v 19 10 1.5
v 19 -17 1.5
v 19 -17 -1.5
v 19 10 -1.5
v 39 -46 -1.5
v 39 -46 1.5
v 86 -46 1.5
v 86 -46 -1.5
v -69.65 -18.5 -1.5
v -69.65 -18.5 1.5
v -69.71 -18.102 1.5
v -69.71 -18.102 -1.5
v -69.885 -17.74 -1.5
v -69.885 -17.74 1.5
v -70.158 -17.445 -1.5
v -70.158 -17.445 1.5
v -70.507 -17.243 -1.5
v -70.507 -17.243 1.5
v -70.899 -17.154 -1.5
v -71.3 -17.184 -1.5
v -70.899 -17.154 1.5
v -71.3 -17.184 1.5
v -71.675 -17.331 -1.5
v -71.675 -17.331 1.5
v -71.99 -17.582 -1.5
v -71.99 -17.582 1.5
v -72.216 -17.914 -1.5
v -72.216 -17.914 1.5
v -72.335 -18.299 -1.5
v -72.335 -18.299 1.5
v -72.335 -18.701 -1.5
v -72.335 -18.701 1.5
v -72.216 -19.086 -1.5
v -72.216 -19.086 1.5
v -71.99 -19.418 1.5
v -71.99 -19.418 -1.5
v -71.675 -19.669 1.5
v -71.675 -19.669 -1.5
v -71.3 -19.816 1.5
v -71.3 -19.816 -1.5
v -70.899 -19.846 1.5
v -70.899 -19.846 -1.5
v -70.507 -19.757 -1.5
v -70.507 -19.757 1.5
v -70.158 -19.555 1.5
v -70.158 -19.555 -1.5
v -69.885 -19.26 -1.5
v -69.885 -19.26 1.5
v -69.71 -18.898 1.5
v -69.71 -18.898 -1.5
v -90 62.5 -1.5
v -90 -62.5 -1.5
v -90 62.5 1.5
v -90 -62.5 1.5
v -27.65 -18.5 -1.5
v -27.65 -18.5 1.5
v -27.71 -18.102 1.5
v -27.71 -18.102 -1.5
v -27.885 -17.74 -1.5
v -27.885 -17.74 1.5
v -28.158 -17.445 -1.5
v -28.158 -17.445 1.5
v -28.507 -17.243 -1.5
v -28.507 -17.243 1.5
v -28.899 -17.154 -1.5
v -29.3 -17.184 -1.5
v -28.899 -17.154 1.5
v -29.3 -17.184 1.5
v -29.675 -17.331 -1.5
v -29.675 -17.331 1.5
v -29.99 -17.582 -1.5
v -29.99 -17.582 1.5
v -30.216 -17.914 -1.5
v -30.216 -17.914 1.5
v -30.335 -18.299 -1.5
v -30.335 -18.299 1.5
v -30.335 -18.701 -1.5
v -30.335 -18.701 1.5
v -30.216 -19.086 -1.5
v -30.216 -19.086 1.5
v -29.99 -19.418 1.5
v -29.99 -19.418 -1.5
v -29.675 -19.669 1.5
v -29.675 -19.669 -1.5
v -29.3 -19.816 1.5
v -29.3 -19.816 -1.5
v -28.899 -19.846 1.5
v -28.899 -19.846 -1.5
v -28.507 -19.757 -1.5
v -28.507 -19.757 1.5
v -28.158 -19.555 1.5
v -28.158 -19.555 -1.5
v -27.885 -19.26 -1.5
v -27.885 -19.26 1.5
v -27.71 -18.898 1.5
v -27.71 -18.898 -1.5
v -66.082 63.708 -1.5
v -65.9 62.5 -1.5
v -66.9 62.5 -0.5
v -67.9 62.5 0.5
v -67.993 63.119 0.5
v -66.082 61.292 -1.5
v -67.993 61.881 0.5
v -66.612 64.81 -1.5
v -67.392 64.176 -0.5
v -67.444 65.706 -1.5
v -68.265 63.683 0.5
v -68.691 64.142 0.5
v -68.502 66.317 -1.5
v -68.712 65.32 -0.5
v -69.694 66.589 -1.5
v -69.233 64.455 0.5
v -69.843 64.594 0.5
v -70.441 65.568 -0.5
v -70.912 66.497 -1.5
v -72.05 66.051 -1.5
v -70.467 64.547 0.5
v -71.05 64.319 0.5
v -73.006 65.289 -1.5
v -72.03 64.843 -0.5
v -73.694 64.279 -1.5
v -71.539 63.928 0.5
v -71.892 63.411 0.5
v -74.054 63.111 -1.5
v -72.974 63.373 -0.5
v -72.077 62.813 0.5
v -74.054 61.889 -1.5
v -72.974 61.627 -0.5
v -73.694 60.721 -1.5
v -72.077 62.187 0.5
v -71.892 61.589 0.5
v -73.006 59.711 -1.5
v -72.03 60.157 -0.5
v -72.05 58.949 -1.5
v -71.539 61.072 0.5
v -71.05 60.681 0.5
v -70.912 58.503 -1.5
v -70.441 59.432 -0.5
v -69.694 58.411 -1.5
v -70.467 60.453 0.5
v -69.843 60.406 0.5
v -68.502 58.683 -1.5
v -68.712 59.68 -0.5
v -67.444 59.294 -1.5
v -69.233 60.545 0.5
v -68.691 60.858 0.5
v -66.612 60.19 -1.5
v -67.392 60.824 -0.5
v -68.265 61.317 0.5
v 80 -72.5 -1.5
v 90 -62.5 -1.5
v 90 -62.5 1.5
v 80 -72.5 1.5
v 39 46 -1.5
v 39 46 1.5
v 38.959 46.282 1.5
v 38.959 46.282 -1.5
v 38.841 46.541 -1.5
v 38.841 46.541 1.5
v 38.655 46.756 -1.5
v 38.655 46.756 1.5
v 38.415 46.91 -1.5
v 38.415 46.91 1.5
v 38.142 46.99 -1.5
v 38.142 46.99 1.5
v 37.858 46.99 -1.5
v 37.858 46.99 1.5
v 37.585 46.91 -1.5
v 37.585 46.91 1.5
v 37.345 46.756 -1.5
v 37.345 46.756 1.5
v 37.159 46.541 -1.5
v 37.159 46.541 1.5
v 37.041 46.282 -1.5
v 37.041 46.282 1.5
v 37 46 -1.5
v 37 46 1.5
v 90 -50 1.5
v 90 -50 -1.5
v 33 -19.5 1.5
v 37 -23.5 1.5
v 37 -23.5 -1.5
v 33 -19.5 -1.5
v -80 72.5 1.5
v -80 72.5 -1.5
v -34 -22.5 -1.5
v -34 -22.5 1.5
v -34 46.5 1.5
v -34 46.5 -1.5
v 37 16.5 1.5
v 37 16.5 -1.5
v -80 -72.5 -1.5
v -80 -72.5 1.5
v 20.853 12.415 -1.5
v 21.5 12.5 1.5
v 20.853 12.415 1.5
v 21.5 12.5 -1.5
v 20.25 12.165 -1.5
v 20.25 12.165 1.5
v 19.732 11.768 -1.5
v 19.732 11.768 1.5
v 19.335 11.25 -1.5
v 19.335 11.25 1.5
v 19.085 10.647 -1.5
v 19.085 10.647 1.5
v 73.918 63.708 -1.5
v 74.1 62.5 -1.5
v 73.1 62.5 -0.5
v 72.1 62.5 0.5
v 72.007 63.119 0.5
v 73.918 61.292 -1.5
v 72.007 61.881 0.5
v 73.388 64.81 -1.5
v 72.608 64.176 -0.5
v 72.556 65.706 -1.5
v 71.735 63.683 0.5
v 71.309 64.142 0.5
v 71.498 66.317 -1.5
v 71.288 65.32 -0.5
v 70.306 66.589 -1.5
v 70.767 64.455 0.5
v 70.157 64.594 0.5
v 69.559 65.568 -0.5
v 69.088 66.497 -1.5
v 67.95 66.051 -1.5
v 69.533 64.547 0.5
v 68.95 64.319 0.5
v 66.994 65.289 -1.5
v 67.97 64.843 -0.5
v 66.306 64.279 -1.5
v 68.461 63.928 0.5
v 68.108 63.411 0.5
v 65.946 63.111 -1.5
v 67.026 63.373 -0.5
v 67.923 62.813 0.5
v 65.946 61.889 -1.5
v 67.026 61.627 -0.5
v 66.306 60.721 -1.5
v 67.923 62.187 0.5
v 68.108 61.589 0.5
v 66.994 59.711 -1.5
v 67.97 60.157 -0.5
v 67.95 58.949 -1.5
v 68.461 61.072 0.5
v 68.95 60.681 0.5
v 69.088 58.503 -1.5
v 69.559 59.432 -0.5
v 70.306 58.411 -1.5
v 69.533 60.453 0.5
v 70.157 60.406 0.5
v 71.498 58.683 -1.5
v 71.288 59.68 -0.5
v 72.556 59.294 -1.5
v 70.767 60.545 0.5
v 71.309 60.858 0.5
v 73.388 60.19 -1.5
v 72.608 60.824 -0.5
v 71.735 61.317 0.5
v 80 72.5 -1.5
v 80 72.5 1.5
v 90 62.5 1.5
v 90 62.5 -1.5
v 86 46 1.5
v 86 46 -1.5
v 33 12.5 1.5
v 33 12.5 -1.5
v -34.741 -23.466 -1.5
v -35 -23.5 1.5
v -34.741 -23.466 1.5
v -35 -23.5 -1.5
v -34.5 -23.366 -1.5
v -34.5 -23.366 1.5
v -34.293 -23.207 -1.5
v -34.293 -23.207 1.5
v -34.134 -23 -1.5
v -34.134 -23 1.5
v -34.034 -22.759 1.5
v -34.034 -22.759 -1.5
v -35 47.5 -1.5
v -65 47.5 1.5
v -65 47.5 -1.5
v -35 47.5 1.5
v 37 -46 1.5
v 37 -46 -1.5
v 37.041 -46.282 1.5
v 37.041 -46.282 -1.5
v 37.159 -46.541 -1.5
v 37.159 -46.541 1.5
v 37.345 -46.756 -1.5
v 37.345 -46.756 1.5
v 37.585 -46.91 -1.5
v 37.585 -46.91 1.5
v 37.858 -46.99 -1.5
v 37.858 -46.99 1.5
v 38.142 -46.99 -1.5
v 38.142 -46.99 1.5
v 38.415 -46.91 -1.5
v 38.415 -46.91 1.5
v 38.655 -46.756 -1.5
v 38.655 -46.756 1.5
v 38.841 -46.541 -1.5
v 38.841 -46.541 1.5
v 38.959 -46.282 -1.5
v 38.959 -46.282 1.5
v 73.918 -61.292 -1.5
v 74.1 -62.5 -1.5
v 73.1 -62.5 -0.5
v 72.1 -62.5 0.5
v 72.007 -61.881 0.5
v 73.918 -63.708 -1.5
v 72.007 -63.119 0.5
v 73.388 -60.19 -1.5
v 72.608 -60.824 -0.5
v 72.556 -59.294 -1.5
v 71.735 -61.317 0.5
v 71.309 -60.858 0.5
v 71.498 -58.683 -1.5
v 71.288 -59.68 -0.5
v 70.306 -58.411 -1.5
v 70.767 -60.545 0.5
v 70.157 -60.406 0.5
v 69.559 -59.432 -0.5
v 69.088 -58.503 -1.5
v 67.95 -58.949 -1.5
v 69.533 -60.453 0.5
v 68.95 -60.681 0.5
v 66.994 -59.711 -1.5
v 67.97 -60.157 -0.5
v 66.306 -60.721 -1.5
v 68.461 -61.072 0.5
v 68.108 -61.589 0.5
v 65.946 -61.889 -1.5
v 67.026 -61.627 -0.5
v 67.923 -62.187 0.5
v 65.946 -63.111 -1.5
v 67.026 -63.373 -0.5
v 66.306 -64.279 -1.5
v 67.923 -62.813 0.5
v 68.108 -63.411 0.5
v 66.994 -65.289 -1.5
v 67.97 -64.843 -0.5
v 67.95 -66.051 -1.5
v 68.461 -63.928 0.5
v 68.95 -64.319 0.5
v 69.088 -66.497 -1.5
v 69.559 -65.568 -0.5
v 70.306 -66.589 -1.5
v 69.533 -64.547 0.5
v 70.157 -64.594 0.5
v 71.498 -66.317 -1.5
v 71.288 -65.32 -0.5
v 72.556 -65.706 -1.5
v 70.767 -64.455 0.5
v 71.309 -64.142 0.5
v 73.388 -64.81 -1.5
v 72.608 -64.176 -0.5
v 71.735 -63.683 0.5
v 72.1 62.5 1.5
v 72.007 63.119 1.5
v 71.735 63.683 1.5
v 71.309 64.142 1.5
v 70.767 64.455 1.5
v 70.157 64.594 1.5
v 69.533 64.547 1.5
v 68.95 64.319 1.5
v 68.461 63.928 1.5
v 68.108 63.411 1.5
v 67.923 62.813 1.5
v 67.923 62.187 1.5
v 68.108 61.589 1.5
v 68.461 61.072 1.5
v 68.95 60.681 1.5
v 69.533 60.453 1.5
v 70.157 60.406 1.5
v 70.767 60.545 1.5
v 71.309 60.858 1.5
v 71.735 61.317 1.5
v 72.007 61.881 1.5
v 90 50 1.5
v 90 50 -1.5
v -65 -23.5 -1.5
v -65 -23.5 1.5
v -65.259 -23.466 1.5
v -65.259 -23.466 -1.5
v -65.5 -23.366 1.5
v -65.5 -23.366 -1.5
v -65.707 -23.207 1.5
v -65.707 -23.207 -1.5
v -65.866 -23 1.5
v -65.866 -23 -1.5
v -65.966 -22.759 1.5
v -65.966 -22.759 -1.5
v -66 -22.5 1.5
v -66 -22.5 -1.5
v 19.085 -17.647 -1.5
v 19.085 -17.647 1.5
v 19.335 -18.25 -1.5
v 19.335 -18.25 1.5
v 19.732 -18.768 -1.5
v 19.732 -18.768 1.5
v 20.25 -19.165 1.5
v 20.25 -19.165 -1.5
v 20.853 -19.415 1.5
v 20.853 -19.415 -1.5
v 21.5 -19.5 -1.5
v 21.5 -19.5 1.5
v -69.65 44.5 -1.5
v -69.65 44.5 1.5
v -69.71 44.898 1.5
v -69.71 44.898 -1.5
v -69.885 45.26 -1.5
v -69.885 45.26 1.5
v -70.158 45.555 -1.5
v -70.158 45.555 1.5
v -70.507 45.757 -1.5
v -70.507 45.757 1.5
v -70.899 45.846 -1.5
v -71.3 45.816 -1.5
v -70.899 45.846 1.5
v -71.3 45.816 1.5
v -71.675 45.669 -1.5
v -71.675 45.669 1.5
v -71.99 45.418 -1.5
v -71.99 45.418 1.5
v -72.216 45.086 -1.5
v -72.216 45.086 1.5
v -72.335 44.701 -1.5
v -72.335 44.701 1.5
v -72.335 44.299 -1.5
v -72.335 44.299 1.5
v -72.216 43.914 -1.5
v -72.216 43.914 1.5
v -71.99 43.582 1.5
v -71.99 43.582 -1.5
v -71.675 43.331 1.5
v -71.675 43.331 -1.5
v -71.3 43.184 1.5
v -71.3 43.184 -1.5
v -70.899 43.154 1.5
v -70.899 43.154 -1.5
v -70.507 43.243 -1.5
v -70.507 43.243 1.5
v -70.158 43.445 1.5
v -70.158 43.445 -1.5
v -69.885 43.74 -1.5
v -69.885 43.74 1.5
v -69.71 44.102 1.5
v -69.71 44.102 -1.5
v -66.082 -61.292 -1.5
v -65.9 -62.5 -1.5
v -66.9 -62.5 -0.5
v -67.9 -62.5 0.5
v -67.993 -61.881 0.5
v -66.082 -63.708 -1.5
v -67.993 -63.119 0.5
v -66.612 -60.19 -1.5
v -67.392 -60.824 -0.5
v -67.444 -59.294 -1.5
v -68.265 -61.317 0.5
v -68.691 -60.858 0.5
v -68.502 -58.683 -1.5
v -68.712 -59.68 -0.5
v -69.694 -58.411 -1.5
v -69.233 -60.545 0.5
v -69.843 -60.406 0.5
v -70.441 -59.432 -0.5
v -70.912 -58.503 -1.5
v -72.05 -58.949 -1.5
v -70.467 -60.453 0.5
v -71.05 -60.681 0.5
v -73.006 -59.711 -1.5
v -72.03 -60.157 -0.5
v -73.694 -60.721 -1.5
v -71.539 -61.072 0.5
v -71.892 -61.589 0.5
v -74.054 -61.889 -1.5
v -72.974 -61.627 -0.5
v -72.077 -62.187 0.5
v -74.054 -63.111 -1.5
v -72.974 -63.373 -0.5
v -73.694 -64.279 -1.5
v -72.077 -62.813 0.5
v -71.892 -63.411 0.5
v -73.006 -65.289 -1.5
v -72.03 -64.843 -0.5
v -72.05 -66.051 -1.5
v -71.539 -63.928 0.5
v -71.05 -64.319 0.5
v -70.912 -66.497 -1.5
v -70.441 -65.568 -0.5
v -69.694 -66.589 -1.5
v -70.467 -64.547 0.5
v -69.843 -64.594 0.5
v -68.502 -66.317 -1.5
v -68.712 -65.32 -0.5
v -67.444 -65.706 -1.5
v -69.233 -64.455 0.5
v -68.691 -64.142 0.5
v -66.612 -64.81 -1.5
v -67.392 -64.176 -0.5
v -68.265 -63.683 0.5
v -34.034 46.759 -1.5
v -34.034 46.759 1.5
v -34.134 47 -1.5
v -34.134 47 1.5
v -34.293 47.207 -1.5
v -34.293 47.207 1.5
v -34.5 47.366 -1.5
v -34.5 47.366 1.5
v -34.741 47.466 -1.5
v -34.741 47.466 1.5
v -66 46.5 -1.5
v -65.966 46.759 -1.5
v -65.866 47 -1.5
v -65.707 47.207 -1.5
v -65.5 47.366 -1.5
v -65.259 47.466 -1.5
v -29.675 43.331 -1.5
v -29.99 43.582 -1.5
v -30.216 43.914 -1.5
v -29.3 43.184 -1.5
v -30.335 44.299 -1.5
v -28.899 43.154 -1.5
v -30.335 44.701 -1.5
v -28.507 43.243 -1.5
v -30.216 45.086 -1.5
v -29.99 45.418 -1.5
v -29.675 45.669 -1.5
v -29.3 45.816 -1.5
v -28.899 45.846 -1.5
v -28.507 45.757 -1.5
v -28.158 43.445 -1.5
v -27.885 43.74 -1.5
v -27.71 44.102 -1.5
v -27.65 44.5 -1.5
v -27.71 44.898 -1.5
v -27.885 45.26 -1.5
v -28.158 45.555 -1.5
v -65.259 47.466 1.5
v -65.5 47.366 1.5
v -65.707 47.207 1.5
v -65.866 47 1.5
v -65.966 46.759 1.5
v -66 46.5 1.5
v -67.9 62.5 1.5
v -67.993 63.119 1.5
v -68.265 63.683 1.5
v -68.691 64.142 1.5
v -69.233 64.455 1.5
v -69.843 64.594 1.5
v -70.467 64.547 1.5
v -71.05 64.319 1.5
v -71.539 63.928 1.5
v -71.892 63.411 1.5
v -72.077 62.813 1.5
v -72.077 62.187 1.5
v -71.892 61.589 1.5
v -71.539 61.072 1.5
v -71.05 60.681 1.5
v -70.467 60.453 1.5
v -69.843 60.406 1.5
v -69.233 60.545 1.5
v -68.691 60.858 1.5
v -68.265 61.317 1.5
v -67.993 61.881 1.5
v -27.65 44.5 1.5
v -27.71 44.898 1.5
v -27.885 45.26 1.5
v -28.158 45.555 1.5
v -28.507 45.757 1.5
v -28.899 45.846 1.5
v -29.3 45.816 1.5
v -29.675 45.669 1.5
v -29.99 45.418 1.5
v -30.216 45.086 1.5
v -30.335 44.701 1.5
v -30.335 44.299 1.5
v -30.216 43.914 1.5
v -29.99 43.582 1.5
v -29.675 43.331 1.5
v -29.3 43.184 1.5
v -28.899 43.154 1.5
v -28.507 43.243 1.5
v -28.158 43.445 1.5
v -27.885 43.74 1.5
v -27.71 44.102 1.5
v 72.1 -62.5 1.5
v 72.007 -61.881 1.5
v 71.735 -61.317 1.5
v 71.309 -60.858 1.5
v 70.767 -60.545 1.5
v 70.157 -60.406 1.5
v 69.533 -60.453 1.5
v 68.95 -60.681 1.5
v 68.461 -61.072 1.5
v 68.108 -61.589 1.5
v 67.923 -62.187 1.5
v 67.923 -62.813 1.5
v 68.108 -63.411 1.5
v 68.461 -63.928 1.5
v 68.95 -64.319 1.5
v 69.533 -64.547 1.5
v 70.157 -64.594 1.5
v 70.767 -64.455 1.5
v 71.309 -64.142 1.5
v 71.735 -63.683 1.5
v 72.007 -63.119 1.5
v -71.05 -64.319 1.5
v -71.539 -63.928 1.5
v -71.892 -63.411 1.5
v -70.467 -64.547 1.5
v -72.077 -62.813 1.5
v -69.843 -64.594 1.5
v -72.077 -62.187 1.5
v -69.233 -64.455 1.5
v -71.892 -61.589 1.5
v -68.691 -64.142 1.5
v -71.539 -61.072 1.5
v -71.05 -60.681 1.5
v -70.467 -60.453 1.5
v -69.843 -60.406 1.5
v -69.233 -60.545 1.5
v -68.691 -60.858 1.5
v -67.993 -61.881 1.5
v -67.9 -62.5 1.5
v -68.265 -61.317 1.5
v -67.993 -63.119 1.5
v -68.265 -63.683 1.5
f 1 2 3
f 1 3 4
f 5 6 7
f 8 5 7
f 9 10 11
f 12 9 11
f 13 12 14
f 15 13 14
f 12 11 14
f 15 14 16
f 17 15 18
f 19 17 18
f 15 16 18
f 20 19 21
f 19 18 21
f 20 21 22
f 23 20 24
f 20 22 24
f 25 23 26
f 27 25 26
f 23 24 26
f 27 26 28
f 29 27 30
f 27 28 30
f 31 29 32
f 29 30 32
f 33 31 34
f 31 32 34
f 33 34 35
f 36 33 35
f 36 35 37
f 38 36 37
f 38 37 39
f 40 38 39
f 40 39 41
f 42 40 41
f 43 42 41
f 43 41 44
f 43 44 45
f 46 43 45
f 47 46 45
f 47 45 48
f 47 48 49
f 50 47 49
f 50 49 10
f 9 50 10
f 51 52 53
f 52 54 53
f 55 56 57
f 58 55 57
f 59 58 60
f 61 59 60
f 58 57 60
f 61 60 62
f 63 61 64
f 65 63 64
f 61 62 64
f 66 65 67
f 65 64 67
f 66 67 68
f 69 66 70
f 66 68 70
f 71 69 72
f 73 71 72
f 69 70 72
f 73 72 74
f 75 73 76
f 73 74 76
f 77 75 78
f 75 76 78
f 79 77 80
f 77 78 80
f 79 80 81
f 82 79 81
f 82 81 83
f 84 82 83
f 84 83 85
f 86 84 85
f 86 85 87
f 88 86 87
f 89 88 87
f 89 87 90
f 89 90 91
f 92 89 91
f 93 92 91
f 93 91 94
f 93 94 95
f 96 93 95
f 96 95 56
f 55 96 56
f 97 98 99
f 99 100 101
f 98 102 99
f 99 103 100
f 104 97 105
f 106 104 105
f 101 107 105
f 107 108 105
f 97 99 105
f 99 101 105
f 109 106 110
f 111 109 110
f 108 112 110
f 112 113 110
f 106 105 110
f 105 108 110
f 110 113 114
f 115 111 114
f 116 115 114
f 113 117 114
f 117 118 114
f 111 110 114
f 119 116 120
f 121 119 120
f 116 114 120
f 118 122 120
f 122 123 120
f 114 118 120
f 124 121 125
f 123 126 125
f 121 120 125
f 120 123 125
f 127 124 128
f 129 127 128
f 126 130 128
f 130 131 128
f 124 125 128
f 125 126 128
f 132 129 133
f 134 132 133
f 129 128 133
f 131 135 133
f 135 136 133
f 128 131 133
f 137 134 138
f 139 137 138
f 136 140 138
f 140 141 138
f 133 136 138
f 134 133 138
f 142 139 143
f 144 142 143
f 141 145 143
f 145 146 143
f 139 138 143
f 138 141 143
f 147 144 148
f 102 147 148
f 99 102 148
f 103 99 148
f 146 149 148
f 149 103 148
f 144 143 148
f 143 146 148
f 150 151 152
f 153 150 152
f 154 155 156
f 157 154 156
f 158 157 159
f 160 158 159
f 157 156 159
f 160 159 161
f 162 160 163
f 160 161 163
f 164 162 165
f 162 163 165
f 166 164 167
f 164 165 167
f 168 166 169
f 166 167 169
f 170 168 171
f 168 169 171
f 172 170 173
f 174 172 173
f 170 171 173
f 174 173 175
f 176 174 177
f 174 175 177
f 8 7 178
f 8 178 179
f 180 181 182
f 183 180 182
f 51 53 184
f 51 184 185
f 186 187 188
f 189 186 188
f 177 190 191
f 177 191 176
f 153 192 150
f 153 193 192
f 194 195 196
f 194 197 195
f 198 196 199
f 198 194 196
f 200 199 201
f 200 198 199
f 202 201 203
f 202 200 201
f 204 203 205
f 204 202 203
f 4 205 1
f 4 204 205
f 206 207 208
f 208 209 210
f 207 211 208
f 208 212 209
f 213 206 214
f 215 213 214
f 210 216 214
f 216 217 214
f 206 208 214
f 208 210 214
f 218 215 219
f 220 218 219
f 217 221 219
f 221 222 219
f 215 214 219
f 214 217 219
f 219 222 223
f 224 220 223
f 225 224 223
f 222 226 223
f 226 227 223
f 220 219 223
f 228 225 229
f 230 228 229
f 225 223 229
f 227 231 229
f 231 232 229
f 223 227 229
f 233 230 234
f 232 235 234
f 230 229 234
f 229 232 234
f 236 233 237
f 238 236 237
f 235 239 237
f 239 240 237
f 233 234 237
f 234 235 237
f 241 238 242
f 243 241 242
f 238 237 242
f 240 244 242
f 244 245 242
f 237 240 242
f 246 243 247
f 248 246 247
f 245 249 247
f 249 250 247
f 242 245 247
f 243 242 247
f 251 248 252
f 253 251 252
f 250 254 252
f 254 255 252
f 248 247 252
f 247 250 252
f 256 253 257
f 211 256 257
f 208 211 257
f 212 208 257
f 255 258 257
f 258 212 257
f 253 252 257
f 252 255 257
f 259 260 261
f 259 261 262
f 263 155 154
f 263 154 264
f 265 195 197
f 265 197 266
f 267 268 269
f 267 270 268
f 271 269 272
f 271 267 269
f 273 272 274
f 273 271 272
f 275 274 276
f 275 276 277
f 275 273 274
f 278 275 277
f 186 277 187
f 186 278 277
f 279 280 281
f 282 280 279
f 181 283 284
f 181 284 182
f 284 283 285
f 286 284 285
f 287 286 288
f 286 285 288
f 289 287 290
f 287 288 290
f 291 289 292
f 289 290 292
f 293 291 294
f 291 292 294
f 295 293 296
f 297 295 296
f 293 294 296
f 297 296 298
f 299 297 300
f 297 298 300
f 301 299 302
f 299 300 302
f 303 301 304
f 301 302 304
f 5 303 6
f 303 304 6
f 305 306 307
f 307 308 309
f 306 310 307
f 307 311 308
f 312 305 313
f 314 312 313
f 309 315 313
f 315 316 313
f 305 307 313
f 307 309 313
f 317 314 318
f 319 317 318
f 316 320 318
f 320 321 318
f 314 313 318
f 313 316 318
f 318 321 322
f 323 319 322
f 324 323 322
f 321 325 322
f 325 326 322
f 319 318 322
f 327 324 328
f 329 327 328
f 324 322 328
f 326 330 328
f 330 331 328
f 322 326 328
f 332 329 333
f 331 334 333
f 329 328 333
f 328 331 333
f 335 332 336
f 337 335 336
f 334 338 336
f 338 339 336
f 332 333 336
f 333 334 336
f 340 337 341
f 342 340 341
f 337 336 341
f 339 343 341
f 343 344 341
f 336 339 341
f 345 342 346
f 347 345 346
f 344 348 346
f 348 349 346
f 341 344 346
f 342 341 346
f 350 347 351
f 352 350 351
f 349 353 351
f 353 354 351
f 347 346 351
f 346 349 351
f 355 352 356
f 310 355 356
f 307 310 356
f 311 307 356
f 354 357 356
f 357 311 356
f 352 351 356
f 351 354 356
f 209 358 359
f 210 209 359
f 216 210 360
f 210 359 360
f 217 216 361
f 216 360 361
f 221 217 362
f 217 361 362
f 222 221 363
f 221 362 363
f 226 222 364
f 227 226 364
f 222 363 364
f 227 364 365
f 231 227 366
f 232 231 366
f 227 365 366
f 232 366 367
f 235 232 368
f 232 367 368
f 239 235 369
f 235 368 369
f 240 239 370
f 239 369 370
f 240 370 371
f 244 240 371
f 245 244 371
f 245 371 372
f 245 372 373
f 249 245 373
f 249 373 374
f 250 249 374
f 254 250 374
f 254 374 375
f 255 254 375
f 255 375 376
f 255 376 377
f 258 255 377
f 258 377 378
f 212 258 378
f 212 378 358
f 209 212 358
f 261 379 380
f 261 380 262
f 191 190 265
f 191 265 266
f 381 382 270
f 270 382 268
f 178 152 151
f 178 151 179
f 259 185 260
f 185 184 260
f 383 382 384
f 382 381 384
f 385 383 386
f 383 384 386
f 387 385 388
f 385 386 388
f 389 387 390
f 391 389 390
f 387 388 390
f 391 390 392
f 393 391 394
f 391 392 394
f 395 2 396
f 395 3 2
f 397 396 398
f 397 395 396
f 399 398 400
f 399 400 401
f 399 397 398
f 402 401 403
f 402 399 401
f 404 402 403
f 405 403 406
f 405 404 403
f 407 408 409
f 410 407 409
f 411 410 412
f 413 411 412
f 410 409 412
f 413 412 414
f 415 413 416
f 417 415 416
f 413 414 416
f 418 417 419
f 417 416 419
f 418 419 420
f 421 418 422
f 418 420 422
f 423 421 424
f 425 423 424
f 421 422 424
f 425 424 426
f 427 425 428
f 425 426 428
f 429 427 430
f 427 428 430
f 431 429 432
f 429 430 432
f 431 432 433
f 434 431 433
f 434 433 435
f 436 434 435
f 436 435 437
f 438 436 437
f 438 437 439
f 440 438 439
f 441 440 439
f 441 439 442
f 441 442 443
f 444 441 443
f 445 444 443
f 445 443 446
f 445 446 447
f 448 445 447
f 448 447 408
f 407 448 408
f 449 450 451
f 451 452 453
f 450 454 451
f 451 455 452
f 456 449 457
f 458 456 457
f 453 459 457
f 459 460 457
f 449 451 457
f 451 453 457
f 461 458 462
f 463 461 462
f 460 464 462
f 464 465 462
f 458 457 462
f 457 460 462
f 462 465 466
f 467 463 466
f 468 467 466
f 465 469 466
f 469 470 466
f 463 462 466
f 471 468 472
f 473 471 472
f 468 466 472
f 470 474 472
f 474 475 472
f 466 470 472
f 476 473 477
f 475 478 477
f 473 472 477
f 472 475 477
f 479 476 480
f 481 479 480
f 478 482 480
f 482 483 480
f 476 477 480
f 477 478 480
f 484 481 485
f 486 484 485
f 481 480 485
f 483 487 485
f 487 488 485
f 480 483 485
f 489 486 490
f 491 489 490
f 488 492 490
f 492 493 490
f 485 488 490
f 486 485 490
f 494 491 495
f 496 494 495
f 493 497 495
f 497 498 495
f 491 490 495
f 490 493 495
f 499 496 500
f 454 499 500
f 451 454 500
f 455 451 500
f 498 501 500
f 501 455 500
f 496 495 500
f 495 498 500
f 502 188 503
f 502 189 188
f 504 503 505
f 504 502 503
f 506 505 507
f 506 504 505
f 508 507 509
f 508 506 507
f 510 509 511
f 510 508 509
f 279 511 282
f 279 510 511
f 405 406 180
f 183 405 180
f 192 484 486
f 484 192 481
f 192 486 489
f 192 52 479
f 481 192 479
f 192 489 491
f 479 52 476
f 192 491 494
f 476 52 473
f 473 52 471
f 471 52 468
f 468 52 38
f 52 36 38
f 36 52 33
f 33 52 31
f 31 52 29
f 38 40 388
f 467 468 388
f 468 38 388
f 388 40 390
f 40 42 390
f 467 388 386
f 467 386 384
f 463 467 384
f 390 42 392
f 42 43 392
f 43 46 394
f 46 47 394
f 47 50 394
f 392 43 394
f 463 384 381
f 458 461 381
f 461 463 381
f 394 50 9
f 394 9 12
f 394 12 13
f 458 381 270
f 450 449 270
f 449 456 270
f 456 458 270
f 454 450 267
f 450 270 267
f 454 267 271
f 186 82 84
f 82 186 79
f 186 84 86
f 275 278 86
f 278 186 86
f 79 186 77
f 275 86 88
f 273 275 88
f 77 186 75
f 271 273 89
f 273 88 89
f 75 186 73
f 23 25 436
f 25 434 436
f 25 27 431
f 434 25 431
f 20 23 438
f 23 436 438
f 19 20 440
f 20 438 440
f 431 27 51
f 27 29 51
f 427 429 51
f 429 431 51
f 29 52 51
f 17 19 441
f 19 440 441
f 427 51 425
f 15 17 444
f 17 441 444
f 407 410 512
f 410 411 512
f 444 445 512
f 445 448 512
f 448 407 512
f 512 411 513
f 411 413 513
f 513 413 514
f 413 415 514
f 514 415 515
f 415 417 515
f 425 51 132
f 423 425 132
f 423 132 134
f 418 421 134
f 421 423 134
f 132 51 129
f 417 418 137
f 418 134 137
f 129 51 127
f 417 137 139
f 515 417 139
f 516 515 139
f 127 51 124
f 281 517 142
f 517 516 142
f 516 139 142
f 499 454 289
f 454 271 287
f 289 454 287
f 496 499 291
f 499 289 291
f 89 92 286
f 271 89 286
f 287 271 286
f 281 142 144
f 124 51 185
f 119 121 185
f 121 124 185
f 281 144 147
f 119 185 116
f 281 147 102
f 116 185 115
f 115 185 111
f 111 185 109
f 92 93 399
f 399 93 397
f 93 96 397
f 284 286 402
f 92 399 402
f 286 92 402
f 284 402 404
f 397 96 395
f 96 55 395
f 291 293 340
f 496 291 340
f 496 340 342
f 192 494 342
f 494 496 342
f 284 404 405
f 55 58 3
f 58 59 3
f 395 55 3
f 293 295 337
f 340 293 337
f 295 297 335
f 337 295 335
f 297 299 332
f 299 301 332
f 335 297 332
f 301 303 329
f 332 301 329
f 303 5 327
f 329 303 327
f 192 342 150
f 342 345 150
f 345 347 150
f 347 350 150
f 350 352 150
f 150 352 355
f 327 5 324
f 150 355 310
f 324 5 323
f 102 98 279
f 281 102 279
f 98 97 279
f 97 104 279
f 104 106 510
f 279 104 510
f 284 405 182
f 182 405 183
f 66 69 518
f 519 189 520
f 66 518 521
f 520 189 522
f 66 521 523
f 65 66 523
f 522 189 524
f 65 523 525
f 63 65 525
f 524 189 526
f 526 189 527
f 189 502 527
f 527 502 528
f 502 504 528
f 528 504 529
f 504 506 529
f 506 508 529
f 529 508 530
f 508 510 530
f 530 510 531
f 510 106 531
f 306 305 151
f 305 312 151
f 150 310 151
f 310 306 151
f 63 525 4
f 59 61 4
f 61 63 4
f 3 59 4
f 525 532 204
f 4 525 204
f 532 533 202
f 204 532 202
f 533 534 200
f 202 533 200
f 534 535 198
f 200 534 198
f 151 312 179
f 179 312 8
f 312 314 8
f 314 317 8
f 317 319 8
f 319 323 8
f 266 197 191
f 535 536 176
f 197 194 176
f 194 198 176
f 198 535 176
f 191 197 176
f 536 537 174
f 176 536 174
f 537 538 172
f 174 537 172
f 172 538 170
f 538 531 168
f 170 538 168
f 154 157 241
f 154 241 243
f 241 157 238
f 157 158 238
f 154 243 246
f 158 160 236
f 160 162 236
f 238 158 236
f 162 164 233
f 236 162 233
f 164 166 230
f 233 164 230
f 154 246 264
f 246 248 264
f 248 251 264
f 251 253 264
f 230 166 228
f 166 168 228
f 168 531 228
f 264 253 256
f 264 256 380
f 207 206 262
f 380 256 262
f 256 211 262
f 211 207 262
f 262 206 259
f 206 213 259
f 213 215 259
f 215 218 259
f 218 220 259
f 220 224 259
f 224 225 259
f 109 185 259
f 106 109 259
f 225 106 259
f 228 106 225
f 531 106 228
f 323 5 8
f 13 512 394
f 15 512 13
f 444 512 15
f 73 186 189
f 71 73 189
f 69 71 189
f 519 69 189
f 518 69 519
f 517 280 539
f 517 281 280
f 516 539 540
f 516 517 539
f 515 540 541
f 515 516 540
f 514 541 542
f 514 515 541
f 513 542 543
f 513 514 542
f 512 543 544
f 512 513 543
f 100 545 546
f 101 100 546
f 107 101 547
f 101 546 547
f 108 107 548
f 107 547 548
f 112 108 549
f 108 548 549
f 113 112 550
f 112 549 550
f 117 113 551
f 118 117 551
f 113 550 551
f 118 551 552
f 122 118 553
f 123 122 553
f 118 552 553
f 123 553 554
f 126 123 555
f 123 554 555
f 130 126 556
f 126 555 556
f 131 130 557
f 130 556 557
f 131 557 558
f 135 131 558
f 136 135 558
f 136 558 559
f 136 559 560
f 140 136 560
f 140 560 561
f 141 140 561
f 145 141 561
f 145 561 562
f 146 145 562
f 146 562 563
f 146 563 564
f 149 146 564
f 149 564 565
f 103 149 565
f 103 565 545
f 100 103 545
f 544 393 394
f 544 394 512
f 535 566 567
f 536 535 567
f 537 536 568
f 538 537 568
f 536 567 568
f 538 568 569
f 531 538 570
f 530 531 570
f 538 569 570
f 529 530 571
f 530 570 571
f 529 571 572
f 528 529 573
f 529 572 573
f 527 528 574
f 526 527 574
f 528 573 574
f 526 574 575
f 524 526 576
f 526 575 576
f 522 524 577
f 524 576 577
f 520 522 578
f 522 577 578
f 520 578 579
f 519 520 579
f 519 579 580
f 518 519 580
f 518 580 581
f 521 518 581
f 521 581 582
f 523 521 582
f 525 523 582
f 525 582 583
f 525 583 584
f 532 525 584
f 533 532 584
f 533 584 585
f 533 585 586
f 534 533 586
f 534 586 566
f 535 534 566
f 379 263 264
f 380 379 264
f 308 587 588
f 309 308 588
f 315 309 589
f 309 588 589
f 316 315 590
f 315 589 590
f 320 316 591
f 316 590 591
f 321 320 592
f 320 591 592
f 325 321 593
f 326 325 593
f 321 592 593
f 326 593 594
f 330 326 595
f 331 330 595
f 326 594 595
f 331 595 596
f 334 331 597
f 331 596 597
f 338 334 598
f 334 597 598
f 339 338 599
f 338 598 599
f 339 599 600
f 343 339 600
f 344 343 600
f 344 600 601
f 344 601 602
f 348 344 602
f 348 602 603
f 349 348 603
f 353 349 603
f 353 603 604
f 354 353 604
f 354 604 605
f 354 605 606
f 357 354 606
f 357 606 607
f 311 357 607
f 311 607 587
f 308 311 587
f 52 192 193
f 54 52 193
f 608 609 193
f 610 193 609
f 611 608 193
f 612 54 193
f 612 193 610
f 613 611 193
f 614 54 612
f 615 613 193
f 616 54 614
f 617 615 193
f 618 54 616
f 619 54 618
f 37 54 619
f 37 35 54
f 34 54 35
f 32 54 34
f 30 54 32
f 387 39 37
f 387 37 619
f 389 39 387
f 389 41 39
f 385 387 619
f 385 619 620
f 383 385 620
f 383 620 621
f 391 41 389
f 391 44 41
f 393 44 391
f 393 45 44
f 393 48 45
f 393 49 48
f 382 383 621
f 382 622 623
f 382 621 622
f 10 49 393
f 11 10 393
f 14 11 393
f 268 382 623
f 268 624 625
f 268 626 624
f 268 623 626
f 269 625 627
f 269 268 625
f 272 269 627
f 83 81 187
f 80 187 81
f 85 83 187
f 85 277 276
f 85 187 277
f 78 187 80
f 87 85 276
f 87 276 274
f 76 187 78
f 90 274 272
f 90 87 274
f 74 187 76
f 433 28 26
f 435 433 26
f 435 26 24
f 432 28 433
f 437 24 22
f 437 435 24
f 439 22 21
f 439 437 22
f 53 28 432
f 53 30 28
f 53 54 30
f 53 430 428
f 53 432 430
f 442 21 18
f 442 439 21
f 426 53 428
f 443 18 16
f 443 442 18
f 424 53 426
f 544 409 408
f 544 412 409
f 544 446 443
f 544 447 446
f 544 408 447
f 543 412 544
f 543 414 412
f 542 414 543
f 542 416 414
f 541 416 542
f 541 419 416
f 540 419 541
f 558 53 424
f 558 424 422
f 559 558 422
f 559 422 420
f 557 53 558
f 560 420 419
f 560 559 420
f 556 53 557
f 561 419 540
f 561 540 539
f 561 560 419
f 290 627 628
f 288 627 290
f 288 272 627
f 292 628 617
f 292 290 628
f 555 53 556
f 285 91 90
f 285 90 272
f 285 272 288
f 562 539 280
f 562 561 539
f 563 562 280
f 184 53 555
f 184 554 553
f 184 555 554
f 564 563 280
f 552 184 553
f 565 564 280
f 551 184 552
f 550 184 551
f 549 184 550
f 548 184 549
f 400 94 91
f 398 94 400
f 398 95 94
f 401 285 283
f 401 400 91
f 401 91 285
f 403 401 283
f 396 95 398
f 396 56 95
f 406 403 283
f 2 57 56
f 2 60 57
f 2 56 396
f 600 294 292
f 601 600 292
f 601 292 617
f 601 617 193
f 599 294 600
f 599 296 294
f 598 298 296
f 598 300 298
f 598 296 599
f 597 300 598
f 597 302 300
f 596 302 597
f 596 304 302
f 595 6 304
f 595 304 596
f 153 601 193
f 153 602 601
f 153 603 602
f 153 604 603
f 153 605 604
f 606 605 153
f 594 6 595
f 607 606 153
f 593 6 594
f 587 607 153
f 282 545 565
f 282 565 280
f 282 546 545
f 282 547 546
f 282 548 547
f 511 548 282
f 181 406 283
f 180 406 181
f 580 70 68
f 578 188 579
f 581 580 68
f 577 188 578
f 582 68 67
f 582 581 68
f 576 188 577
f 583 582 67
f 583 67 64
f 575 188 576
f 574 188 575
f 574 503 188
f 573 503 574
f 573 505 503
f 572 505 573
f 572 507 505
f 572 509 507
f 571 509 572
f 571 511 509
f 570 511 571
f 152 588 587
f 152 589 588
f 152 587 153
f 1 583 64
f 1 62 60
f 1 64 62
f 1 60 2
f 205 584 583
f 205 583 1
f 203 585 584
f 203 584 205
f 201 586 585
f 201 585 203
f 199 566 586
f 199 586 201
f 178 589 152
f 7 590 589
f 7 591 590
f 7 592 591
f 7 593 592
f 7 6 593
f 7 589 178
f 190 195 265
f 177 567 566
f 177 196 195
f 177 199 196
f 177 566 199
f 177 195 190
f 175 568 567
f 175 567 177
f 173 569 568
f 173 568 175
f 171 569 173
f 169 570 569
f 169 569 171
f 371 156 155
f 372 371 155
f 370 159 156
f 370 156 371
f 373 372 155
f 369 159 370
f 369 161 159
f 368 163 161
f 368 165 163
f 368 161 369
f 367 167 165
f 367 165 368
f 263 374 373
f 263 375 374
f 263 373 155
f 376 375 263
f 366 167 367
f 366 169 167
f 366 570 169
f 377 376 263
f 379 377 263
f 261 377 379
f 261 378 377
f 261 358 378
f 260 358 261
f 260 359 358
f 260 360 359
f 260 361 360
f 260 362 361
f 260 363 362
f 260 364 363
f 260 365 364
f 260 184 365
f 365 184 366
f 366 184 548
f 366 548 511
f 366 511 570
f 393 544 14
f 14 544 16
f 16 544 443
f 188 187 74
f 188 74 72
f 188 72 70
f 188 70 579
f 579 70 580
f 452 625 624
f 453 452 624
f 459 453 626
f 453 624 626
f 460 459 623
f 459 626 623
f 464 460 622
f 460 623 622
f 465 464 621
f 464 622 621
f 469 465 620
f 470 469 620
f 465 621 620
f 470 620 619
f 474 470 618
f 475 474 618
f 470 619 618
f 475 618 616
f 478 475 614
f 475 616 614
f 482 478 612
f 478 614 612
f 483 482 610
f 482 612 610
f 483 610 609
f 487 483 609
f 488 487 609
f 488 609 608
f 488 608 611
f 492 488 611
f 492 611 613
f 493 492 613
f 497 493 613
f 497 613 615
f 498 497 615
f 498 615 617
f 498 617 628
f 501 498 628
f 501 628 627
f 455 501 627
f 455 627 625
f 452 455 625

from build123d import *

# Parameters (mm, degrees)
SKETCH_1_W          = 180
SKETCH_1_H          = 145
EXTRUDE_1_DEPTH     = 1.5
SKETCH_2_R          = 2.1
SKETCH_2_W          = 53
SKETCH_2_H          = 92
CUT_EXTRUDE_1_DEPTH = 116.608174451
SKETCH_4_W          = 18
SKETCH_4_H          = 32
CUT_EXTRUDE_3_DEPTH = 116.608174451
SKETCH_3_R          = 1
CUT_EXTRUDE_2_DEPTH = 116.608174451
FILLET_1_R          = 2.5
CHAMFER_1_SIZE      = 2
CHAMFER_2_SIZE      = 10
CHAMFER_3_SIZE      = 4
SKETCH_5_R          = 1.35
SKETCH_5_W          = 32
SKETCH_5_H          = 71
CUT_EXTRUDE_4_DEPTH = 116.608174451
FILLET_2_R          = 1


with BuildPart() as part:
    # 草图1 → 凸台-拉伸1 (new, symmetric)
    with BuildSketch(Plane.XY):
        Rectangle(SKETCH_1_W, SKETCH_1_H)
    extrude(amount=EXTRUDE_1_DEPTH, both=True)

    # 草图2 → 切除-拉伸1 (cut, through all)
    with BuildSketch(Plane.XY.offset(1.5)):
        with Locations((-70, 62.5)):
            Circle(SKETCH_2_R)
        with Locations((-70, -62.5)):
            Circle(SKETCH_2_R)
        with Locations((70, -62.5)):
            Circle(SKETCH_2_R)
        with Locations((70, 62.5)):
            Circle(SKETCH_2_R)
        with Locations((63.5, 0)):
            Rectangle(SKETCH_2_W, SKETCH_2_H)
    extrude(amount=-CUT_EXTRUDE_1_DEPTH, mode=Mode.SUBTRACT)

    # 草图4 → 切除-拉伸3 (cut, through all)
    with BuildSketch(Plane.XY.offset(1.5)):
        with Locations((28, -3.5)):
            Rectangle(SKETCH_4_W, SKETCH_4_H)
    extrude(amount=-CUT_EXTRUDE_3_DEPTH, mode=Mode.SUBTRACT)

    # 草图3 → 切除-拉伸2 (cut, through all)
    with BuildSketch(Plane.XY.offset(1.5)):
        with Locations((38, 46)):
            Circle(SKETCH_3_R)
        with Locations((38, -46)):
            Circle(SKETCH_3_R)
    extrude(amount=-CUT_EXTRUDE_2_DEPTH, mode=Mode.SUBTRACT)

    # 圆角1
    fillet_1_edges = [part.edges().sort_by_distance(p)[0] for p in [
        (19, -19.5, 0),
        (19, 12.5, 0),
    ]]
    fillet(fillet_1_edges, radius=FILLET_1_R)

    # 倒角1
    chamfer_1_edges = [part.edges().sort_by_distance(p)[0] for p in [
        (67.9, 62.5, -1.5),
        (67.9, -62.5, -1.5),
        (-72.1, -62.5, -1.5),
        (-72.1, 62.5, -1.5),
    ]]
    chamfer(chamfer_1_edges, length=CHAMFER_1_SIZE)

    # 倒角2
    chamfer_2_edges = [part.edges().sort_by_distance(p)[0] for p in [
        (-90, 72.5, 0),
        (90, 72.5, 0),
        (90, -72.5, 0),
        (-90, -72.5, 0),
    ]]
    chamfer(chamfer_2_edges, length=CHAMFER_2_SIZE)

    # 倒角3
    chamfer_3_edges = [part.edges().sort_by_distance(p)[0] for p in [
        (90, 46, 0),
        (90, -46, 0),
        (37, 12.5, 0),
        (37, -19.5, 0),
    ]]
    chamfer(chamfer_3_edges, length=CHAMFER_3_SIZE)

    # 草图5 → 切除-拉伸4 (cut, through all)
    with BuildSketch(Plane.XY.offset(1.5)):
        with Locations((-71, 44.5)):
            Circle(SKETCH_5_R)
        with Locations((-29, 44.5)):
            Circle(SKETCH_5_R)
        with Locations((-71, -18.5)):
            Circle(SKETCH_5_R)
        with Locations((-29, -18.5)):
            Circle(SKETCH_5_R)
        with Locations((-50, 12)):
            Rectangle(SKETCH_5_W, SKETCH_5_H)
    extrude(amount=-CUT_EXTRUDE_4_DEPTH, mode=Mode.SUBTRACT)

    # 圆角2
    fillet_2_edges = [part.edges().sort_by_distance(p)[0] for p in [
        (-66, -23.5, 0),
        (-66, 47.5, 0),
        (-34, 47.5, 0),
        (-34, -23.5, 0),
    ]]
    fillet(fillet_2_edges, radius=FILLET_2_R)


solid = part.part
